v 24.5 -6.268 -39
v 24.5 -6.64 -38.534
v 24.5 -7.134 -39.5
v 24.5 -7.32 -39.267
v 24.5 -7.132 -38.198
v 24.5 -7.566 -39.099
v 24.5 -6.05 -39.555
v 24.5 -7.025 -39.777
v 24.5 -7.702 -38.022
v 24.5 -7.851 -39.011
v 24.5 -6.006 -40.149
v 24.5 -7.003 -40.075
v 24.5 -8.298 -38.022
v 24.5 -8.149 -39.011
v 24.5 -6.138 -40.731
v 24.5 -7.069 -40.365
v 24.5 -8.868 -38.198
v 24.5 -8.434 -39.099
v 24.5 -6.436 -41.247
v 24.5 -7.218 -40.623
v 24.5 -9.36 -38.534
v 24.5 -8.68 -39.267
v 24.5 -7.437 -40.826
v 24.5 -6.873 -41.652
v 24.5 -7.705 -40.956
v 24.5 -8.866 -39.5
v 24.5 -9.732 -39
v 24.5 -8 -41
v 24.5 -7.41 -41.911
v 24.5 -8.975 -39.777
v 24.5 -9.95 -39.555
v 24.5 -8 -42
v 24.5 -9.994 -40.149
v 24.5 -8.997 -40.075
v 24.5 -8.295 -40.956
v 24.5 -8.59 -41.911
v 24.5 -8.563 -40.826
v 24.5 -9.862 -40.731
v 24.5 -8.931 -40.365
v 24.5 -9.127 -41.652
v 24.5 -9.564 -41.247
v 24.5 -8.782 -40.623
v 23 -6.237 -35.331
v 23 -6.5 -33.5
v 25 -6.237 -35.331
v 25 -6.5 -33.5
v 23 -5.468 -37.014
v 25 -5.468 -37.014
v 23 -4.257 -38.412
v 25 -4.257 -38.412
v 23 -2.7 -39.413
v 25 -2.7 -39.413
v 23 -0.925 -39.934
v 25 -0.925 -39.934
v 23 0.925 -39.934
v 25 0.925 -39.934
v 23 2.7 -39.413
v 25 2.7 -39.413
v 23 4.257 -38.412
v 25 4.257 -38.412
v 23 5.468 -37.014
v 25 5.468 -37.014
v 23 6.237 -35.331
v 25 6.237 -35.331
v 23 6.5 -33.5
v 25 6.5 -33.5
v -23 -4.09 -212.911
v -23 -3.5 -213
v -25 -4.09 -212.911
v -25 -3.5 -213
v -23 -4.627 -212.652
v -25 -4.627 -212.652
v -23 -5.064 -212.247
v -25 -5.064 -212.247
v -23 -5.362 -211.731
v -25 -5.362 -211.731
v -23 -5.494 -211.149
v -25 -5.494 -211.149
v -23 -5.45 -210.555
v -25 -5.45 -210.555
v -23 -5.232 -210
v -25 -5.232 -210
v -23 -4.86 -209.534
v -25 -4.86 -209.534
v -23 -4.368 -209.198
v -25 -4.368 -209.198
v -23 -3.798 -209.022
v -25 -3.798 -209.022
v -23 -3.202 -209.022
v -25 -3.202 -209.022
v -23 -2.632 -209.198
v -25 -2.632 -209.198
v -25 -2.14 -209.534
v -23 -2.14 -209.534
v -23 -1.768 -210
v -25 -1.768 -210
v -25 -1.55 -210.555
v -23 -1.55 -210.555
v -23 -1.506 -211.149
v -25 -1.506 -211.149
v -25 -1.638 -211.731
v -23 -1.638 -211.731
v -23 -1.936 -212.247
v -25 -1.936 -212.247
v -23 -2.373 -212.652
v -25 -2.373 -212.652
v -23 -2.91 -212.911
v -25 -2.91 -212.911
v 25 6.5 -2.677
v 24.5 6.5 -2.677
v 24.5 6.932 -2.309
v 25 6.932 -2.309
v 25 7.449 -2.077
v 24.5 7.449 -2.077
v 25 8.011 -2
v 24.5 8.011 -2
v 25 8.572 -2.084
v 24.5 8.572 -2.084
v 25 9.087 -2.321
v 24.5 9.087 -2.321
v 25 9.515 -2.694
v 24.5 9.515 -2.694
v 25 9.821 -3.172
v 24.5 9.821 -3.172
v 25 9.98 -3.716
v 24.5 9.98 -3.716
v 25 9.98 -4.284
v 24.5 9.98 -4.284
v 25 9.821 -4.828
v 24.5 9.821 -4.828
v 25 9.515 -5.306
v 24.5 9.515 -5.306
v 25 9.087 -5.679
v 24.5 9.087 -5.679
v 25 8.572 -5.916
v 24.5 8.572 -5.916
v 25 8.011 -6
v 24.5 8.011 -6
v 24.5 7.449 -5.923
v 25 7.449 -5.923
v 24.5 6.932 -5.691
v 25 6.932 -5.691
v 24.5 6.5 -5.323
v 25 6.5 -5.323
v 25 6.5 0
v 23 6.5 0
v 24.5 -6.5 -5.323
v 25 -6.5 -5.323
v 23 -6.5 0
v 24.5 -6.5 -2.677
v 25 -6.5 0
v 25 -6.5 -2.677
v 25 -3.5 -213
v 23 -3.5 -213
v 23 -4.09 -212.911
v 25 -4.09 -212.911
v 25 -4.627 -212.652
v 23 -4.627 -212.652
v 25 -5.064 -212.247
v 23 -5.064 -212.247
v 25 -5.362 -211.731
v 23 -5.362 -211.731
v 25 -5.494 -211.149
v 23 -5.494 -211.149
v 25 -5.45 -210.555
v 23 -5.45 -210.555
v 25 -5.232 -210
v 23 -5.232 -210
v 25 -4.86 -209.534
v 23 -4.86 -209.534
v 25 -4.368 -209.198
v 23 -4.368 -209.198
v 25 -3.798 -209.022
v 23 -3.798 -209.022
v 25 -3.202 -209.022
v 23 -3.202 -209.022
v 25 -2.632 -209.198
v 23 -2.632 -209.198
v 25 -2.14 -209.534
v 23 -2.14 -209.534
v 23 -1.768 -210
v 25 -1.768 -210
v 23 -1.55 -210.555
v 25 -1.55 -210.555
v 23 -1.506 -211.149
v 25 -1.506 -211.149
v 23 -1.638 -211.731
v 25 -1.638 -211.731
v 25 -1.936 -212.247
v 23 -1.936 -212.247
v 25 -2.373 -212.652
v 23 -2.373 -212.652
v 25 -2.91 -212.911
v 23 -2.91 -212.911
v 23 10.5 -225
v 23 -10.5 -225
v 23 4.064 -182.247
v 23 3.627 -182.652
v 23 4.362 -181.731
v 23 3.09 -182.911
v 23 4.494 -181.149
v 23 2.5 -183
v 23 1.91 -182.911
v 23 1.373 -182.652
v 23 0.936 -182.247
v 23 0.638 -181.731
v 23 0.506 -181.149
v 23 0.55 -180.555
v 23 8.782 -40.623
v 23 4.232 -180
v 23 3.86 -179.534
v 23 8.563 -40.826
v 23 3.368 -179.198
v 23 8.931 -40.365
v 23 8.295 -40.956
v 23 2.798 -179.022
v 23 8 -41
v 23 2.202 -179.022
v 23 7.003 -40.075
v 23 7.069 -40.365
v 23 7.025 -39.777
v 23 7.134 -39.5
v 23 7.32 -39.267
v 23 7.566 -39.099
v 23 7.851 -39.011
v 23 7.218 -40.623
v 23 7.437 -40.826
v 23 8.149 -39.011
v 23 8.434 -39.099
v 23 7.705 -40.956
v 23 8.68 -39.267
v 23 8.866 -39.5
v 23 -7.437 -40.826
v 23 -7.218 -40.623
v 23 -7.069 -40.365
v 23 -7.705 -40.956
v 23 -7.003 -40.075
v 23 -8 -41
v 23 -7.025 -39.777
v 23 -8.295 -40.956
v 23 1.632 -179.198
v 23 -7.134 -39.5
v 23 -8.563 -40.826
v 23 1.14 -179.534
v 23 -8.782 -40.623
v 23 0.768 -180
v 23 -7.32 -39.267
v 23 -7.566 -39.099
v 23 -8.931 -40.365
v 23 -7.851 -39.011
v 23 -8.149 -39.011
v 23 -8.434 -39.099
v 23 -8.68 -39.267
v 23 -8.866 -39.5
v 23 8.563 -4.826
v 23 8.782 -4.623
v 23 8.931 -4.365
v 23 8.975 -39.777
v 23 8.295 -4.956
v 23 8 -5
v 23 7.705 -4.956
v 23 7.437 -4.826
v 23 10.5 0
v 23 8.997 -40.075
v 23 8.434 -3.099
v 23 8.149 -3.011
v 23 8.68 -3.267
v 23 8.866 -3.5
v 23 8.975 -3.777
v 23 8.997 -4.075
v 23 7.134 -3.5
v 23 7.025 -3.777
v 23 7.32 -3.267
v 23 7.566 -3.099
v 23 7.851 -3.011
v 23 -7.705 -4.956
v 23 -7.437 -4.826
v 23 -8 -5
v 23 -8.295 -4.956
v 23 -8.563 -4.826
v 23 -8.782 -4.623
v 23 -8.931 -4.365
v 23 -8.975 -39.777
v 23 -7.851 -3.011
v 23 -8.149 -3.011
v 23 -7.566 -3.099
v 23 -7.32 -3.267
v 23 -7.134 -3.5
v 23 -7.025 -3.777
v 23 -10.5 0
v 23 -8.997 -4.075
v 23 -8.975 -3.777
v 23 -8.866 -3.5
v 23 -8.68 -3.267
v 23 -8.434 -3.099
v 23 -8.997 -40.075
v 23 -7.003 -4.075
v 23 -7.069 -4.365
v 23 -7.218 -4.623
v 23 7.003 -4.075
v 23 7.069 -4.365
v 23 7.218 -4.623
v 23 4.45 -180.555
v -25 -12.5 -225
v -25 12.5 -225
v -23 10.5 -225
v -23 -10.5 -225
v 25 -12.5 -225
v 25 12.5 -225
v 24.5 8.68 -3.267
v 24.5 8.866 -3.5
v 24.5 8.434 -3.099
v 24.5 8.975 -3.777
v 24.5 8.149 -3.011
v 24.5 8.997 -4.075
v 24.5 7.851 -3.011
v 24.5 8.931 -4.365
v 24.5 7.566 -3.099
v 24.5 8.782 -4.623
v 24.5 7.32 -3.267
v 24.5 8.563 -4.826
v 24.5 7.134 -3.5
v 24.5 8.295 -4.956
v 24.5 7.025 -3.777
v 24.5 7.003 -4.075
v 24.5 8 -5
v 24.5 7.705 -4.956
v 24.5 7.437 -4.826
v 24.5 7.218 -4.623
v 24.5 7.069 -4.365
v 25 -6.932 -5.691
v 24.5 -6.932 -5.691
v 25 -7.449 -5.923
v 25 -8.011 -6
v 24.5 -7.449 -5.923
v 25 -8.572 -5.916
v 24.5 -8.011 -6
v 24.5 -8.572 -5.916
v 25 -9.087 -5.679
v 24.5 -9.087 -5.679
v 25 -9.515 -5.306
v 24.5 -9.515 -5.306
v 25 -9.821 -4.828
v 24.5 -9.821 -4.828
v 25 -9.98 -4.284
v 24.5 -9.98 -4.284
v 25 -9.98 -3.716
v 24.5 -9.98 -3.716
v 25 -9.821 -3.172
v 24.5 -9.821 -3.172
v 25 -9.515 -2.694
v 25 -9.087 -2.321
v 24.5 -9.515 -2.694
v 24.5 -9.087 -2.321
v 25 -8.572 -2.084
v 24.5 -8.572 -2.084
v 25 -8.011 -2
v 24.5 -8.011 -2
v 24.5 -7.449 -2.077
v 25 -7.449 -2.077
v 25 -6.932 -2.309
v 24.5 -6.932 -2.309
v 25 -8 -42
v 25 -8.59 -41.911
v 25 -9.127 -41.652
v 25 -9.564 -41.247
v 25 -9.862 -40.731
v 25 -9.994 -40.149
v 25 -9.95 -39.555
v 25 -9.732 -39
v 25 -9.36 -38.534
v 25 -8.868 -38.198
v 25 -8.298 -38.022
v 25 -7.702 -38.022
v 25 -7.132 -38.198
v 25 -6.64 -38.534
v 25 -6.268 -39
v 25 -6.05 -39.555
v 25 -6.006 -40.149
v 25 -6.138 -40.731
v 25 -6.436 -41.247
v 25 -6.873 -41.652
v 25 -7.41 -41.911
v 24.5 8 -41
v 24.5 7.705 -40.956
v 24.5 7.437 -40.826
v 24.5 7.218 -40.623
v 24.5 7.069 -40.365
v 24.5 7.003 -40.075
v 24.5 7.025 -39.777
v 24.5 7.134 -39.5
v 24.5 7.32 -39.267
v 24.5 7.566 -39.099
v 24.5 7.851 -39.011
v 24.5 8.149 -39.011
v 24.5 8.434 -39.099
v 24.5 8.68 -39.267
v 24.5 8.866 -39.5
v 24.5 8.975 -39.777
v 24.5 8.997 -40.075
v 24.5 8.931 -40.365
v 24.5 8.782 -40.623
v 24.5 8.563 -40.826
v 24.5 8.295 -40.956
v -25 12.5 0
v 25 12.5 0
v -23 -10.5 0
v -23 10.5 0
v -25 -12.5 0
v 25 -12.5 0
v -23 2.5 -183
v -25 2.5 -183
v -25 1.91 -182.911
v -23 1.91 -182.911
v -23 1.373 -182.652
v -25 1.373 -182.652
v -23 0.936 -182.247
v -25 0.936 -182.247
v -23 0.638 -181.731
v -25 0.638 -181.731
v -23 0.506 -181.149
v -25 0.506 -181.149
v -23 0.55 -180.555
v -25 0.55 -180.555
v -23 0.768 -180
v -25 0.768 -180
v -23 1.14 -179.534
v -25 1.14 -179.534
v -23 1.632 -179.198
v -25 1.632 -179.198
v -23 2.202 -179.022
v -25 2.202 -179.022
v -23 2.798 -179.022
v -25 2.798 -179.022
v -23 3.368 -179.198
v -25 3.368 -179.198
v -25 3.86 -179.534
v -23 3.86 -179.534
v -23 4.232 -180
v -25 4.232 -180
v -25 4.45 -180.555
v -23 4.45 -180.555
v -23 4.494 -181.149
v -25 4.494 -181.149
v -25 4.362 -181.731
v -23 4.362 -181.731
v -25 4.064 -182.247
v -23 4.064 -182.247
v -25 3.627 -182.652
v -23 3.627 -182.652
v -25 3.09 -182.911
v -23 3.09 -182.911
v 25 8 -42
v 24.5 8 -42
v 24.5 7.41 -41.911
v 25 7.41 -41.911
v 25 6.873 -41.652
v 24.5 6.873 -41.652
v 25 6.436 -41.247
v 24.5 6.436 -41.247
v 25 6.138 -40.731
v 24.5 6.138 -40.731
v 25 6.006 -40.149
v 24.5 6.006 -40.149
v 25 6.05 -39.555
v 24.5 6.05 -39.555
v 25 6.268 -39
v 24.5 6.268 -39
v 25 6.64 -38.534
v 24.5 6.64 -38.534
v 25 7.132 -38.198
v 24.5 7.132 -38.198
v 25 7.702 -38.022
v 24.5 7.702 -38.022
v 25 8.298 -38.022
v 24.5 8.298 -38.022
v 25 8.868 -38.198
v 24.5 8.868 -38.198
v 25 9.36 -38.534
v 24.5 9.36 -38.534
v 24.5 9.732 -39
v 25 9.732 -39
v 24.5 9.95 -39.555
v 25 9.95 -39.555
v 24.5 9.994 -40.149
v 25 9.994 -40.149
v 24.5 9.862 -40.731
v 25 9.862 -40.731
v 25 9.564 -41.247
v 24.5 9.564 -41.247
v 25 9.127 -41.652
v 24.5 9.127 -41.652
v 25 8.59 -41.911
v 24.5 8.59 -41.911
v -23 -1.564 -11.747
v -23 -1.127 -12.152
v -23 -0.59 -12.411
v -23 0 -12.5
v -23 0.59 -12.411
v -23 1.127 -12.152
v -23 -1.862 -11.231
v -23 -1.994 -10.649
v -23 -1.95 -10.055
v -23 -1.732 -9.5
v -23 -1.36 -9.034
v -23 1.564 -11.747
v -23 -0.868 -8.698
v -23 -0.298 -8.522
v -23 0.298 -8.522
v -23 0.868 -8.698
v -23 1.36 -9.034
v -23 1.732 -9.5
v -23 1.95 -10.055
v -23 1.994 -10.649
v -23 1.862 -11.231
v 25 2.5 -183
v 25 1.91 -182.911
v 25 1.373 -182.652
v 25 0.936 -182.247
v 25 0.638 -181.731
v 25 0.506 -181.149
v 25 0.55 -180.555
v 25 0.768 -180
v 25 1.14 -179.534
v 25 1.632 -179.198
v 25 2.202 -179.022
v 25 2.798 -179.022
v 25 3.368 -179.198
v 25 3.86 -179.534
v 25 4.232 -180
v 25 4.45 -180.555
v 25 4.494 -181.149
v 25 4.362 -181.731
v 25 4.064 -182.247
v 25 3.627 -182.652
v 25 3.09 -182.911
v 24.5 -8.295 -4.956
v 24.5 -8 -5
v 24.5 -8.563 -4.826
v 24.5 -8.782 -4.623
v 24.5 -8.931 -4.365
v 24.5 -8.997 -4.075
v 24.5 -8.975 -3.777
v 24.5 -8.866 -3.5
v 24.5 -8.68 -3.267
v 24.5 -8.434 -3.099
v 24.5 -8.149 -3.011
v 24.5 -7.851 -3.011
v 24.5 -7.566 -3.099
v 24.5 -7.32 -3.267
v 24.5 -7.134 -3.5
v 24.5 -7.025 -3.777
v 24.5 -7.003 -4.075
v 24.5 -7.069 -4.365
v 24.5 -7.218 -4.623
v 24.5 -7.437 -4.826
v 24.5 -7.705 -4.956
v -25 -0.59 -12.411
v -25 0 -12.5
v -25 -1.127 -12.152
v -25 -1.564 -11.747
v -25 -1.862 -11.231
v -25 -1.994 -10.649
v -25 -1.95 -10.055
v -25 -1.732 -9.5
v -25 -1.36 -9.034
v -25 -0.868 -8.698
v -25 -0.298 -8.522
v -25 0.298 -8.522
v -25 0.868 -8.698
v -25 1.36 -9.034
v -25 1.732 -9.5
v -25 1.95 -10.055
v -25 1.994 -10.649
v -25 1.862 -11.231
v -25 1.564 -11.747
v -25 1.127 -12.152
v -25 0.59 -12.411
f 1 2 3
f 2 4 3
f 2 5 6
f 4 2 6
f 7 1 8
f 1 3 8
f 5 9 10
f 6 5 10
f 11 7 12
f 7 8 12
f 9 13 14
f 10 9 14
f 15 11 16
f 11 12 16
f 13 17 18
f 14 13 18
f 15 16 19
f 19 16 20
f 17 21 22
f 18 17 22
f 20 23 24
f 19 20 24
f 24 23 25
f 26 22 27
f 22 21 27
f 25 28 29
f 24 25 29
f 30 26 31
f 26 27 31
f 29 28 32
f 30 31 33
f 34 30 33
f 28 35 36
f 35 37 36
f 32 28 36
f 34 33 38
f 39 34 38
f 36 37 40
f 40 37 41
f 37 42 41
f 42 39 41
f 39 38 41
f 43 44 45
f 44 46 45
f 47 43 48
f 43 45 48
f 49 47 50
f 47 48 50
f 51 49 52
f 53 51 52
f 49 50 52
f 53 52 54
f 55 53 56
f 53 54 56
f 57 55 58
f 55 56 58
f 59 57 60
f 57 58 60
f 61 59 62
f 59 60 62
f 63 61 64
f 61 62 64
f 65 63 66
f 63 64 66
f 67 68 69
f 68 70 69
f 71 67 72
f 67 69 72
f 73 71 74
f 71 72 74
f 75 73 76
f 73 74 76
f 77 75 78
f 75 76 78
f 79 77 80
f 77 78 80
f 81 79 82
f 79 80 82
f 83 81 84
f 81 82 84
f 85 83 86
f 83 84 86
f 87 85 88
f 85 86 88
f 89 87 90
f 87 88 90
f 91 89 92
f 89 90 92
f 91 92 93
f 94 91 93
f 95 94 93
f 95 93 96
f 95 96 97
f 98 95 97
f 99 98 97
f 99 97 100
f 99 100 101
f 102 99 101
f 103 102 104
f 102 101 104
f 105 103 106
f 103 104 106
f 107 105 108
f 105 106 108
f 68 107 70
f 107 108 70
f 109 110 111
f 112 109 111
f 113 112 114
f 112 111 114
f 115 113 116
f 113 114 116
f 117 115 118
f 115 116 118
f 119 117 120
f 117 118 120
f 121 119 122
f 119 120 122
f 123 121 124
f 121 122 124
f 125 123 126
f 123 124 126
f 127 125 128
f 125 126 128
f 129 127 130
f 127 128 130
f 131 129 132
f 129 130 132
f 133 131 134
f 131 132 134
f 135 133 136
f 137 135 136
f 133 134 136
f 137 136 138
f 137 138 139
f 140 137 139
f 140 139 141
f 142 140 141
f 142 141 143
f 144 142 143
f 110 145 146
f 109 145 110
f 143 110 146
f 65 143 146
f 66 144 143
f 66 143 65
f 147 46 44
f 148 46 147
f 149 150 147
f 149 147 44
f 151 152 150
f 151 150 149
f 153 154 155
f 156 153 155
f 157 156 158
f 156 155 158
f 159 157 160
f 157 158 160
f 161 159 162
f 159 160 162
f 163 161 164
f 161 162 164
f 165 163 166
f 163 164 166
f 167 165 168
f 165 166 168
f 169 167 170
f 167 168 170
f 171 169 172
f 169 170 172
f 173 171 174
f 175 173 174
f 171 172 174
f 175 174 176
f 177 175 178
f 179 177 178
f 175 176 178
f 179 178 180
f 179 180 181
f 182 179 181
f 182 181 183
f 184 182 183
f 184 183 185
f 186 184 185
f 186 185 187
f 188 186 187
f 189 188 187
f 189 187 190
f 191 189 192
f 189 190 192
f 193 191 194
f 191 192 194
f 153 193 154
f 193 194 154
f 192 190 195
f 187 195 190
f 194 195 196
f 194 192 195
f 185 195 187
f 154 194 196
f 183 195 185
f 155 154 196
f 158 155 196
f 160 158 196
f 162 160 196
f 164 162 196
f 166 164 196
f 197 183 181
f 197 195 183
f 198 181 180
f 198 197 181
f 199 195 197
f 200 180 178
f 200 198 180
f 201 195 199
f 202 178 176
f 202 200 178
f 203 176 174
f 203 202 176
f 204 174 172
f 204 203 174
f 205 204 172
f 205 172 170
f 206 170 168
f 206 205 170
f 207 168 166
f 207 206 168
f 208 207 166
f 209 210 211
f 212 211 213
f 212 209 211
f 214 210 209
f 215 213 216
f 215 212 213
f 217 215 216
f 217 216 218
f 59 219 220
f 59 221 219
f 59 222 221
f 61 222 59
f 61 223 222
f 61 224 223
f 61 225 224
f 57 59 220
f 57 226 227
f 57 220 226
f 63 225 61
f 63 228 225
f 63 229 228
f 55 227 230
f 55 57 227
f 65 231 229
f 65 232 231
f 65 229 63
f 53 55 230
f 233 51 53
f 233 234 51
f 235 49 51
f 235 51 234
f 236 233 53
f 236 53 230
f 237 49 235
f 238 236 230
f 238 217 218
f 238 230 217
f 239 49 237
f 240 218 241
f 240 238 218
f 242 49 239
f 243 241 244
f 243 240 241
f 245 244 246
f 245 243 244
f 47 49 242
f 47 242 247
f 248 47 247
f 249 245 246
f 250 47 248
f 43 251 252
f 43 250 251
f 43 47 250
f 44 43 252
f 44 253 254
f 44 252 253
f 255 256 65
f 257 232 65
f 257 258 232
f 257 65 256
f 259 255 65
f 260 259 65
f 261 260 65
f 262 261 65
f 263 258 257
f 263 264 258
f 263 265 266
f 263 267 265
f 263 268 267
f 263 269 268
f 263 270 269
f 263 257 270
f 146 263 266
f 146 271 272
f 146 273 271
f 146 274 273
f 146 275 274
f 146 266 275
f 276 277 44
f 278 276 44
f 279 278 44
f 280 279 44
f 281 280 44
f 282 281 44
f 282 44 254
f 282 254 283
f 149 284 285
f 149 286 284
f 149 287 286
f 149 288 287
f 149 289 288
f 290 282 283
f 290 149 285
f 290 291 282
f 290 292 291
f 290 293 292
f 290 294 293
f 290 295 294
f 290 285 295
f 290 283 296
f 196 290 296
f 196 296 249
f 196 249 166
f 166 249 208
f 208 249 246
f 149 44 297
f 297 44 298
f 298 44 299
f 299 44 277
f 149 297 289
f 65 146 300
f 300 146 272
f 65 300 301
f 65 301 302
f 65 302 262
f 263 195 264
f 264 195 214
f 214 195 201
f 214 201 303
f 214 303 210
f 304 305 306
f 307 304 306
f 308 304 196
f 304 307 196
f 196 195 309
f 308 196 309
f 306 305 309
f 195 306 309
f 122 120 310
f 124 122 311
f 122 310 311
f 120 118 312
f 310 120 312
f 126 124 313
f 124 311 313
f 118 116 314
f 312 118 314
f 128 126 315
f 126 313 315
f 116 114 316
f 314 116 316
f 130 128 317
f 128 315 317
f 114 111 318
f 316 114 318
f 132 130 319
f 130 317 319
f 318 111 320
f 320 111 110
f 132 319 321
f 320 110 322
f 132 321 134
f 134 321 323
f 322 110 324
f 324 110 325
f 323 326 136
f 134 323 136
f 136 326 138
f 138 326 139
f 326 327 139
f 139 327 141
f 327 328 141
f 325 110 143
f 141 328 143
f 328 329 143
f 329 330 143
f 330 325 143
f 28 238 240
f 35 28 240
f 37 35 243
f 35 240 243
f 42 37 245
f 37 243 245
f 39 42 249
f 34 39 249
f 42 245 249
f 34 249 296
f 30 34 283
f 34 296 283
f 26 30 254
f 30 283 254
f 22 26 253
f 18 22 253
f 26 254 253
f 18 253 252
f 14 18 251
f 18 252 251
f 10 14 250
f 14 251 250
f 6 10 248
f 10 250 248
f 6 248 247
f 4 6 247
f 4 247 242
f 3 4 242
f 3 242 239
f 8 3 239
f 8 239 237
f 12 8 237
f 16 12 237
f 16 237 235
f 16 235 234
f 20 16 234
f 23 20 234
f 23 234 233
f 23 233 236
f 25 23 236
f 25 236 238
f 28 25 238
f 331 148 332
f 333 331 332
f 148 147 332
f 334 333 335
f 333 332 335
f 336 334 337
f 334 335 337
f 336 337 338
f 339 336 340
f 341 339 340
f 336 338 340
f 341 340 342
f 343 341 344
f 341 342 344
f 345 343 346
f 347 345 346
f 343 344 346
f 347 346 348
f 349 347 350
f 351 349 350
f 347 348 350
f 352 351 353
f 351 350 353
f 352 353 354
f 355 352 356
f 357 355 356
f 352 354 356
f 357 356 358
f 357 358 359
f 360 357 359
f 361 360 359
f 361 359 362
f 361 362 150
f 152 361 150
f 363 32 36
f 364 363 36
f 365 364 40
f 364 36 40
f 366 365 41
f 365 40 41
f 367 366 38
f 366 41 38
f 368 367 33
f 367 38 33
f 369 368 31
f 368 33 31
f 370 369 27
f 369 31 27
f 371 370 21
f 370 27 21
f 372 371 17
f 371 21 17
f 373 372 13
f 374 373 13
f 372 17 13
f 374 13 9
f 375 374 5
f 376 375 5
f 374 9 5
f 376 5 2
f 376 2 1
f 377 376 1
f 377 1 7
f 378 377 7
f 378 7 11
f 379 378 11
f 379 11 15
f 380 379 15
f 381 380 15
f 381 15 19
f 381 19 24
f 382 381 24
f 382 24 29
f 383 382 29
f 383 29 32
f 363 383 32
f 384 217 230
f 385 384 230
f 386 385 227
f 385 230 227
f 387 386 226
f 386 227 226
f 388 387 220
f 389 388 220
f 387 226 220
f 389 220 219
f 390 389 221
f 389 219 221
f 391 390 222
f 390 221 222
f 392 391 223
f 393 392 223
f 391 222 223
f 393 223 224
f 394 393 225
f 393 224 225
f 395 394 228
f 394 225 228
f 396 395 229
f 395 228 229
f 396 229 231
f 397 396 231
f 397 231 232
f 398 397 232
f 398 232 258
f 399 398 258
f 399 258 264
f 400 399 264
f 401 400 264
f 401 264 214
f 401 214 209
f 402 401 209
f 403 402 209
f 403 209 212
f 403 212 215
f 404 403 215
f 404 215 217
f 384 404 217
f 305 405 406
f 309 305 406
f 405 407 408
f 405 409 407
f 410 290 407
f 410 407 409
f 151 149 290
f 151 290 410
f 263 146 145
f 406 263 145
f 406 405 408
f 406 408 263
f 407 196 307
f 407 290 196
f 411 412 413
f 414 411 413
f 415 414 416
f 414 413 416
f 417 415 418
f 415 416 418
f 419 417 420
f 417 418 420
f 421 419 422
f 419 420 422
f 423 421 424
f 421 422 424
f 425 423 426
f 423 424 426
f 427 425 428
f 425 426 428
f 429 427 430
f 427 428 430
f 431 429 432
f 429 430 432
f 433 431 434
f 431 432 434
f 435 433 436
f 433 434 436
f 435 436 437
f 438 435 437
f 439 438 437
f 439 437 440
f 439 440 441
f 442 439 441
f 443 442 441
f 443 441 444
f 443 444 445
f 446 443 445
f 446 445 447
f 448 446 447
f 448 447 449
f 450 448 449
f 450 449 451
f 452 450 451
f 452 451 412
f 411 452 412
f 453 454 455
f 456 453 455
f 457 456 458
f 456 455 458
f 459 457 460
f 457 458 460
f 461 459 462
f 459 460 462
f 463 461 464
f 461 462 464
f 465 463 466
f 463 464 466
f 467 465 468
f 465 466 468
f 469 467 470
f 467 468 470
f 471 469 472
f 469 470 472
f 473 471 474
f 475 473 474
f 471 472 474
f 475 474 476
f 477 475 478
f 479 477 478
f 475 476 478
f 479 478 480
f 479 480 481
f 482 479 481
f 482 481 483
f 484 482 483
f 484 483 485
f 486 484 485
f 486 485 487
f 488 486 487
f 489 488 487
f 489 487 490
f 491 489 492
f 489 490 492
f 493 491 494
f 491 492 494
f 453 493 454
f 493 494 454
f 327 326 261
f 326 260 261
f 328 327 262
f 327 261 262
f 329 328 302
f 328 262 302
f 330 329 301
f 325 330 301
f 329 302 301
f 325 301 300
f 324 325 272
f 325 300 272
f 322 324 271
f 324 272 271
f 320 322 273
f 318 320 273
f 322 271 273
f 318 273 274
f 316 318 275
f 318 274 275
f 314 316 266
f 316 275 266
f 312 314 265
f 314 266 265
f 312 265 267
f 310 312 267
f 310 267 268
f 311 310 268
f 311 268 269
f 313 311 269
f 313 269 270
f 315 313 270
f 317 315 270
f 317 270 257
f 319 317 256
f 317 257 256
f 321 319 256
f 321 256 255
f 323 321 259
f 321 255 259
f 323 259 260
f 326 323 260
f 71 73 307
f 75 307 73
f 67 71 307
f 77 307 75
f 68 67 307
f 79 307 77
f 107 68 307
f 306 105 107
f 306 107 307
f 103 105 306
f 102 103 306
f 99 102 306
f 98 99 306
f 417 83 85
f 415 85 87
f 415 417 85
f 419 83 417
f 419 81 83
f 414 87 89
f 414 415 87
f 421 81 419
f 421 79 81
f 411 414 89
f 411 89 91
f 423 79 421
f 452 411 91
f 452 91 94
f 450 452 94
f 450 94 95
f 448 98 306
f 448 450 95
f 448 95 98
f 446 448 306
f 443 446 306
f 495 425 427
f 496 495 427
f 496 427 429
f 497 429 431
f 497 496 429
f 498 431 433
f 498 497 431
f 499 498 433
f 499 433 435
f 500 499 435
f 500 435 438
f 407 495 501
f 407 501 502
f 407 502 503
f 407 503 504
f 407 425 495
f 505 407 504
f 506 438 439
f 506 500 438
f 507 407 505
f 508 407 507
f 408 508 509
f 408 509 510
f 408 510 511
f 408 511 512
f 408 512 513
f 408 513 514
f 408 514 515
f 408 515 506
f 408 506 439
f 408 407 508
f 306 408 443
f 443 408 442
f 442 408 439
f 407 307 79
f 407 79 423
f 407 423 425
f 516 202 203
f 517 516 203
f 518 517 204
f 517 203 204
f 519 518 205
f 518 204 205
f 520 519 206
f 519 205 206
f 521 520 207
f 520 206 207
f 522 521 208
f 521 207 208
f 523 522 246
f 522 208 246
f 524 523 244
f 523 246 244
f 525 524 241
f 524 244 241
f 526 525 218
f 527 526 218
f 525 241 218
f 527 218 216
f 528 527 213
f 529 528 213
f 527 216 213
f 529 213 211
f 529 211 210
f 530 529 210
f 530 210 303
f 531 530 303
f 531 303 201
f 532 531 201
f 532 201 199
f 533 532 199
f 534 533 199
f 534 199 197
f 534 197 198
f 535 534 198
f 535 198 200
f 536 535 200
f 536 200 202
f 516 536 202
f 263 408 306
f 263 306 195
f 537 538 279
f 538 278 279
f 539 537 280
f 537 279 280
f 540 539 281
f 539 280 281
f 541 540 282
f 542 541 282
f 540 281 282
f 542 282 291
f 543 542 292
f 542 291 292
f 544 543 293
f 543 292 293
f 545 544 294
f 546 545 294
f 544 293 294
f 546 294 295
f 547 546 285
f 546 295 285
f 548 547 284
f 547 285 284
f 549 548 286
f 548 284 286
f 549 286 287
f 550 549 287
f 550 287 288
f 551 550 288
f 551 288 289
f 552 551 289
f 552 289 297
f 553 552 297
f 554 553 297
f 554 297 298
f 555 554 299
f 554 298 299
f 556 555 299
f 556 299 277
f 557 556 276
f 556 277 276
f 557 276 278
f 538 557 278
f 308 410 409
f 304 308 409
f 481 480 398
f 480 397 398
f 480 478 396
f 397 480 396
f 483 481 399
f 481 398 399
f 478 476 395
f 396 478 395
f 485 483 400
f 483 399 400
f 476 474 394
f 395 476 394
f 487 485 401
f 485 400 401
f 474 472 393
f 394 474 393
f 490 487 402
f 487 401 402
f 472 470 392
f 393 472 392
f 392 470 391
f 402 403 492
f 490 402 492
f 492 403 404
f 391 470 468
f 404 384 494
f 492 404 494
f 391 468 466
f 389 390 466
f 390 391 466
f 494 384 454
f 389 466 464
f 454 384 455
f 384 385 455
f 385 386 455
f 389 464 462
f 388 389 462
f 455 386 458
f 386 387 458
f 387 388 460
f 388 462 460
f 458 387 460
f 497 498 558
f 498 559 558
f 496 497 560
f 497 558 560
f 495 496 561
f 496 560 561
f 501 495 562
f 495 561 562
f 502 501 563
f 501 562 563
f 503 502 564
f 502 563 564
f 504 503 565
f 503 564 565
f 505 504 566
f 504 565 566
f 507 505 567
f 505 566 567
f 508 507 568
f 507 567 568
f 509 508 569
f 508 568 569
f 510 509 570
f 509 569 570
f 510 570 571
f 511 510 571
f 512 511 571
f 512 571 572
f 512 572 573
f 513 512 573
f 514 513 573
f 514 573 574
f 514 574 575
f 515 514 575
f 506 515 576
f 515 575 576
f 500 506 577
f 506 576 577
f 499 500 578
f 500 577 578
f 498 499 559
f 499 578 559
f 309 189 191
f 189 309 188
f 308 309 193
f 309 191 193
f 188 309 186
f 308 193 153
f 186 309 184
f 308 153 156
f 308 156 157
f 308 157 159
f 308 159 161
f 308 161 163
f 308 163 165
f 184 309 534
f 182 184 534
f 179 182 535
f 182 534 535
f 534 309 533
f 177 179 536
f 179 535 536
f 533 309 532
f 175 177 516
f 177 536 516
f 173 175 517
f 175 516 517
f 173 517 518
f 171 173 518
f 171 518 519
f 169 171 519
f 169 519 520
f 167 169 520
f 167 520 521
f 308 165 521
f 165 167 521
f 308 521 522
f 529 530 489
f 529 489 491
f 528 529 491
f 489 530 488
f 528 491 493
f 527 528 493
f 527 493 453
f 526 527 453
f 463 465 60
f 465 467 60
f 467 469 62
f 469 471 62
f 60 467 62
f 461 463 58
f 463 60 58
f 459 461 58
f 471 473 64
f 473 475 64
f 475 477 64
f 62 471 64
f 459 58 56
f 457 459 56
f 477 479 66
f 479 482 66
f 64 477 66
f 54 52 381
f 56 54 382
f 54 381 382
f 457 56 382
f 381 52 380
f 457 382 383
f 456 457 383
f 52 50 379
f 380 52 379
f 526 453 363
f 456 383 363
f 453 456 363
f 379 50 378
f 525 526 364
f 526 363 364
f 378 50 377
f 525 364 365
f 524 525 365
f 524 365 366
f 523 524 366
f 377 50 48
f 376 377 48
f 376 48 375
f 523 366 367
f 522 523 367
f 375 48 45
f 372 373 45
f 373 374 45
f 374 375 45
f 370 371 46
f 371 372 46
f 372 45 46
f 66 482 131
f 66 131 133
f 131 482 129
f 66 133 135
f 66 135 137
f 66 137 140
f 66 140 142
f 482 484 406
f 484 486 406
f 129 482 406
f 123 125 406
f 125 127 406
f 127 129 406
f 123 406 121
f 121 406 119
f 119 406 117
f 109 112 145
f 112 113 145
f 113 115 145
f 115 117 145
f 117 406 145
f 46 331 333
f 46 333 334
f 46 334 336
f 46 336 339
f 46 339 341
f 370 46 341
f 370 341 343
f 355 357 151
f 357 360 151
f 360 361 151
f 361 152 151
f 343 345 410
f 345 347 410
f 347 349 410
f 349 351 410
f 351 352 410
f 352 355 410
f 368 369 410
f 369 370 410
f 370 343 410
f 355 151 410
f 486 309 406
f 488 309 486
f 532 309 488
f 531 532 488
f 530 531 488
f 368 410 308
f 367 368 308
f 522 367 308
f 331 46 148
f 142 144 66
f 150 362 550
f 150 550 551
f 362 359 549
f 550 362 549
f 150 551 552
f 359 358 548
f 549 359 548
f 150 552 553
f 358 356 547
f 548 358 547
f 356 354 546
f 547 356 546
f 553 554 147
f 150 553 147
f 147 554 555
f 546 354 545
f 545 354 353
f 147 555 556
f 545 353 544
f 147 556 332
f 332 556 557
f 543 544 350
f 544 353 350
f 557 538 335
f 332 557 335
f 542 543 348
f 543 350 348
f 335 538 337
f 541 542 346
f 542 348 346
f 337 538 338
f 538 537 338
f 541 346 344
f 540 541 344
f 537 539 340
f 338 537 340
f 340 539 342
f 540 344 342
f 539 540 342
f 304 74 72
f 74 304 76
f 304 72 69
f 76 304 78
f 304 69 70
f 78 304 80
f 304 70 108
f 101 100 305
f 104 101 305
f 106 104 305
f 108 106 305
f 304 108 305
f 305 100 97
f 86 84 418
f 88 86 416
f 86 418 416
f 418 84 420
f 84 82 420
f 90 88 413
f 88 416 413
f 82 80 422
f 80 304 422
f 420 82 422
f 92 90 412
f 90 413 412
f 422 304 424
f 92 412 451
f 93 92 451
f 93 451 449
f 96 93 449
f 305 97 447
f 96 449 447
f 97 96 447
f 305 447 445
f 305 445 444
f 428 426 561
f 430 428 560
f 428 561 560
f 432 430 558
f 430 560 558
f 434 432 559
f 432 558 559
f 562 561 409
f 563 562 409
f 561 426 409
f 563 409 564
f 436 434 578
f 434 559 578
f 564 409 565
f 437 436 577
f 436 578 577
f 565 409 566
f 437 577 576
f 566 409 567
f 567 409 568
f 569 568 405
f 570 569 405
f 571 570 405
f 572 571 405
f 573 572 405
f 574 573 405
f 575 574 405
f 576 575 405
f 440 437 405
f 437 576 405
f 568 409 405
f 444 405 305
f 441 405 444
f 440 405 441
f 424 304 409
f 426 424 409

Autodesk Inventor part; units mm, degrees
ref_plane "YZ Plane" through (0, 0, 0) normal (1, 0, 0) x (0, 1, 0)
ref_plane "XZ Plane" through (0, 0, 0) normal (0, 1, 0) x (-1, 0, 0)
ref_plane "XY Plane" through (0, 0, 0) normal (0, 0, 1) x (1, 0, 0)
sketch "スケッチ1" plane through (0, 0, 0) normal (0, 0, 1) x (1, 0, 0)
  line L0 (-25, 12.5) -> (25, 12.5)
  line L1 (25, 12.5) -> (25, -12.5)
  line L2 (25, -12.5) -> (-25, -12.5)
  line L3 (-25, -12.5) -> (-25, 12.5)
  line L4 (-23, 10.5) -> (23, 10.5)
  line L5 (23, 10.5) -> (23, -10.5)
  line L6 (23, -10.5) -> (-23, -10.5)
  line L7 (-23, -10.5) -> (-23, 10.5)
  point P0 (0, 0)
  dimension "d0" = 50
  dimension "d2" = 25
  dimension "d3" = 21
  dimension "d4" = 46
  dimension "d5" = 23
  dimension "d6" = 25
  dimension "d7" = 10.5
  dimension "d8" = 12.5
extrude "押し出し1" add sketch "スケッチ1" against normal blind 225
sketch "スケッチ2" plane through (25, -12.5, 0) normal (1, 0, 0) x (0, 0, -1)
  line L0 (0, 0) -> (225, 0) projected
  line L1 (225, 25) -> (225, 0) projected
  circle A0 centre (181, 15) radius 2
  circle A1 centre (211, 9) radius 2
  point P0 (0, 12.5)
  dimension "d11" = 4
  dimension "d13" = 30
  dimension "d16" = 14
  dimension "d17" = 9
  dimension "d61" = 15
hole "穴1" at (25, -3.5, -211) at (25, 2.5, -181) direction (-1, 0, 0) diameter 4 end through all
sketch "スケッチ3" plane through (25, -12.5, 0) normal (1, 0, 0) x (0, 0, -1)
  line L0 (0, 25) -> (0, 0) projected
  line L1 (0, 0) -> (225, 0) projected
  circle A0 centre (10.5, 12.5) radius 2
  point P0 (0, 12.5)
  dimension "d25" = 4
  dimension "d27" = 12.5
  dimension "d28" = 10.5
hole "穴2" at (25, 0, -10.5) direction (-1, 0, 0) diameter 4 end through all
sketch "スケッチ4" plane through (25, -12.5, 0) normal (1, 0, 0) x (0, 0, -1)
  circle A0 centre (10.5, 12.5) radius 2 projected
  line L0 (0, 25) -> (0, 0) projected
  line L1 (0, 19) -> (33.5, 19)
  line L2 (33.5, 6) -> (0, 6)
  line L3 (0, 6) -> (0, 19)
  arc A1 (33.5, 6) -> (33.5, 19) centre (33.5, 12.5) ccw
  point P0 (0, 12.5)
  dimension "d36" = 13
  dimension "d38" = 6.5
  dimension "d39" = 13
  dimension "d40" = 33.5
extrude "押し出し2" cut sketch "スケッチ4" against normal blind 2
sketch "スケッチ5" plane through (25, -12.5, -225) normal (1, 0, 0) x (0, 0, -1)
  arc A0 (-191.5, 6) -> (-191.5, 19) centre (-191.5, 12.5) ccw projected
  line L0 (-225, 6) -> (-225, 0) projected
  line L1 (-225, 25) -> (-225, 19) projected
  circle A1 centre (-221, 4.5) radius 1
  circle A2 centre (-221, 20.5) radius 1
  circle A3 centre (-185, 20.5) radius 1
  circle A4 centre (-185, 4.5) radius 1
  point P0 (-225, 12.5)
  dimension "d43" = 36
  dimension "d45" = 36
  dimension "d46" = 16
  dimension "d47" = 8
  dimension "d48" = 2
  dimension "d49" = 16
  dimension "d50" = 8
  dimension "d51" = 4
  dimension "d52" = 4
hole "穴3" at (25, 8, -4) at (25, -8, -4) at (25, -8, -40) at (25, 8, -40) direction (-1, 0, 0) diameter 2 depth 2 tip angle 118 counterbore diameter 4 counterbore depth 0.5
properties part number "Arm_Second_Flame"
